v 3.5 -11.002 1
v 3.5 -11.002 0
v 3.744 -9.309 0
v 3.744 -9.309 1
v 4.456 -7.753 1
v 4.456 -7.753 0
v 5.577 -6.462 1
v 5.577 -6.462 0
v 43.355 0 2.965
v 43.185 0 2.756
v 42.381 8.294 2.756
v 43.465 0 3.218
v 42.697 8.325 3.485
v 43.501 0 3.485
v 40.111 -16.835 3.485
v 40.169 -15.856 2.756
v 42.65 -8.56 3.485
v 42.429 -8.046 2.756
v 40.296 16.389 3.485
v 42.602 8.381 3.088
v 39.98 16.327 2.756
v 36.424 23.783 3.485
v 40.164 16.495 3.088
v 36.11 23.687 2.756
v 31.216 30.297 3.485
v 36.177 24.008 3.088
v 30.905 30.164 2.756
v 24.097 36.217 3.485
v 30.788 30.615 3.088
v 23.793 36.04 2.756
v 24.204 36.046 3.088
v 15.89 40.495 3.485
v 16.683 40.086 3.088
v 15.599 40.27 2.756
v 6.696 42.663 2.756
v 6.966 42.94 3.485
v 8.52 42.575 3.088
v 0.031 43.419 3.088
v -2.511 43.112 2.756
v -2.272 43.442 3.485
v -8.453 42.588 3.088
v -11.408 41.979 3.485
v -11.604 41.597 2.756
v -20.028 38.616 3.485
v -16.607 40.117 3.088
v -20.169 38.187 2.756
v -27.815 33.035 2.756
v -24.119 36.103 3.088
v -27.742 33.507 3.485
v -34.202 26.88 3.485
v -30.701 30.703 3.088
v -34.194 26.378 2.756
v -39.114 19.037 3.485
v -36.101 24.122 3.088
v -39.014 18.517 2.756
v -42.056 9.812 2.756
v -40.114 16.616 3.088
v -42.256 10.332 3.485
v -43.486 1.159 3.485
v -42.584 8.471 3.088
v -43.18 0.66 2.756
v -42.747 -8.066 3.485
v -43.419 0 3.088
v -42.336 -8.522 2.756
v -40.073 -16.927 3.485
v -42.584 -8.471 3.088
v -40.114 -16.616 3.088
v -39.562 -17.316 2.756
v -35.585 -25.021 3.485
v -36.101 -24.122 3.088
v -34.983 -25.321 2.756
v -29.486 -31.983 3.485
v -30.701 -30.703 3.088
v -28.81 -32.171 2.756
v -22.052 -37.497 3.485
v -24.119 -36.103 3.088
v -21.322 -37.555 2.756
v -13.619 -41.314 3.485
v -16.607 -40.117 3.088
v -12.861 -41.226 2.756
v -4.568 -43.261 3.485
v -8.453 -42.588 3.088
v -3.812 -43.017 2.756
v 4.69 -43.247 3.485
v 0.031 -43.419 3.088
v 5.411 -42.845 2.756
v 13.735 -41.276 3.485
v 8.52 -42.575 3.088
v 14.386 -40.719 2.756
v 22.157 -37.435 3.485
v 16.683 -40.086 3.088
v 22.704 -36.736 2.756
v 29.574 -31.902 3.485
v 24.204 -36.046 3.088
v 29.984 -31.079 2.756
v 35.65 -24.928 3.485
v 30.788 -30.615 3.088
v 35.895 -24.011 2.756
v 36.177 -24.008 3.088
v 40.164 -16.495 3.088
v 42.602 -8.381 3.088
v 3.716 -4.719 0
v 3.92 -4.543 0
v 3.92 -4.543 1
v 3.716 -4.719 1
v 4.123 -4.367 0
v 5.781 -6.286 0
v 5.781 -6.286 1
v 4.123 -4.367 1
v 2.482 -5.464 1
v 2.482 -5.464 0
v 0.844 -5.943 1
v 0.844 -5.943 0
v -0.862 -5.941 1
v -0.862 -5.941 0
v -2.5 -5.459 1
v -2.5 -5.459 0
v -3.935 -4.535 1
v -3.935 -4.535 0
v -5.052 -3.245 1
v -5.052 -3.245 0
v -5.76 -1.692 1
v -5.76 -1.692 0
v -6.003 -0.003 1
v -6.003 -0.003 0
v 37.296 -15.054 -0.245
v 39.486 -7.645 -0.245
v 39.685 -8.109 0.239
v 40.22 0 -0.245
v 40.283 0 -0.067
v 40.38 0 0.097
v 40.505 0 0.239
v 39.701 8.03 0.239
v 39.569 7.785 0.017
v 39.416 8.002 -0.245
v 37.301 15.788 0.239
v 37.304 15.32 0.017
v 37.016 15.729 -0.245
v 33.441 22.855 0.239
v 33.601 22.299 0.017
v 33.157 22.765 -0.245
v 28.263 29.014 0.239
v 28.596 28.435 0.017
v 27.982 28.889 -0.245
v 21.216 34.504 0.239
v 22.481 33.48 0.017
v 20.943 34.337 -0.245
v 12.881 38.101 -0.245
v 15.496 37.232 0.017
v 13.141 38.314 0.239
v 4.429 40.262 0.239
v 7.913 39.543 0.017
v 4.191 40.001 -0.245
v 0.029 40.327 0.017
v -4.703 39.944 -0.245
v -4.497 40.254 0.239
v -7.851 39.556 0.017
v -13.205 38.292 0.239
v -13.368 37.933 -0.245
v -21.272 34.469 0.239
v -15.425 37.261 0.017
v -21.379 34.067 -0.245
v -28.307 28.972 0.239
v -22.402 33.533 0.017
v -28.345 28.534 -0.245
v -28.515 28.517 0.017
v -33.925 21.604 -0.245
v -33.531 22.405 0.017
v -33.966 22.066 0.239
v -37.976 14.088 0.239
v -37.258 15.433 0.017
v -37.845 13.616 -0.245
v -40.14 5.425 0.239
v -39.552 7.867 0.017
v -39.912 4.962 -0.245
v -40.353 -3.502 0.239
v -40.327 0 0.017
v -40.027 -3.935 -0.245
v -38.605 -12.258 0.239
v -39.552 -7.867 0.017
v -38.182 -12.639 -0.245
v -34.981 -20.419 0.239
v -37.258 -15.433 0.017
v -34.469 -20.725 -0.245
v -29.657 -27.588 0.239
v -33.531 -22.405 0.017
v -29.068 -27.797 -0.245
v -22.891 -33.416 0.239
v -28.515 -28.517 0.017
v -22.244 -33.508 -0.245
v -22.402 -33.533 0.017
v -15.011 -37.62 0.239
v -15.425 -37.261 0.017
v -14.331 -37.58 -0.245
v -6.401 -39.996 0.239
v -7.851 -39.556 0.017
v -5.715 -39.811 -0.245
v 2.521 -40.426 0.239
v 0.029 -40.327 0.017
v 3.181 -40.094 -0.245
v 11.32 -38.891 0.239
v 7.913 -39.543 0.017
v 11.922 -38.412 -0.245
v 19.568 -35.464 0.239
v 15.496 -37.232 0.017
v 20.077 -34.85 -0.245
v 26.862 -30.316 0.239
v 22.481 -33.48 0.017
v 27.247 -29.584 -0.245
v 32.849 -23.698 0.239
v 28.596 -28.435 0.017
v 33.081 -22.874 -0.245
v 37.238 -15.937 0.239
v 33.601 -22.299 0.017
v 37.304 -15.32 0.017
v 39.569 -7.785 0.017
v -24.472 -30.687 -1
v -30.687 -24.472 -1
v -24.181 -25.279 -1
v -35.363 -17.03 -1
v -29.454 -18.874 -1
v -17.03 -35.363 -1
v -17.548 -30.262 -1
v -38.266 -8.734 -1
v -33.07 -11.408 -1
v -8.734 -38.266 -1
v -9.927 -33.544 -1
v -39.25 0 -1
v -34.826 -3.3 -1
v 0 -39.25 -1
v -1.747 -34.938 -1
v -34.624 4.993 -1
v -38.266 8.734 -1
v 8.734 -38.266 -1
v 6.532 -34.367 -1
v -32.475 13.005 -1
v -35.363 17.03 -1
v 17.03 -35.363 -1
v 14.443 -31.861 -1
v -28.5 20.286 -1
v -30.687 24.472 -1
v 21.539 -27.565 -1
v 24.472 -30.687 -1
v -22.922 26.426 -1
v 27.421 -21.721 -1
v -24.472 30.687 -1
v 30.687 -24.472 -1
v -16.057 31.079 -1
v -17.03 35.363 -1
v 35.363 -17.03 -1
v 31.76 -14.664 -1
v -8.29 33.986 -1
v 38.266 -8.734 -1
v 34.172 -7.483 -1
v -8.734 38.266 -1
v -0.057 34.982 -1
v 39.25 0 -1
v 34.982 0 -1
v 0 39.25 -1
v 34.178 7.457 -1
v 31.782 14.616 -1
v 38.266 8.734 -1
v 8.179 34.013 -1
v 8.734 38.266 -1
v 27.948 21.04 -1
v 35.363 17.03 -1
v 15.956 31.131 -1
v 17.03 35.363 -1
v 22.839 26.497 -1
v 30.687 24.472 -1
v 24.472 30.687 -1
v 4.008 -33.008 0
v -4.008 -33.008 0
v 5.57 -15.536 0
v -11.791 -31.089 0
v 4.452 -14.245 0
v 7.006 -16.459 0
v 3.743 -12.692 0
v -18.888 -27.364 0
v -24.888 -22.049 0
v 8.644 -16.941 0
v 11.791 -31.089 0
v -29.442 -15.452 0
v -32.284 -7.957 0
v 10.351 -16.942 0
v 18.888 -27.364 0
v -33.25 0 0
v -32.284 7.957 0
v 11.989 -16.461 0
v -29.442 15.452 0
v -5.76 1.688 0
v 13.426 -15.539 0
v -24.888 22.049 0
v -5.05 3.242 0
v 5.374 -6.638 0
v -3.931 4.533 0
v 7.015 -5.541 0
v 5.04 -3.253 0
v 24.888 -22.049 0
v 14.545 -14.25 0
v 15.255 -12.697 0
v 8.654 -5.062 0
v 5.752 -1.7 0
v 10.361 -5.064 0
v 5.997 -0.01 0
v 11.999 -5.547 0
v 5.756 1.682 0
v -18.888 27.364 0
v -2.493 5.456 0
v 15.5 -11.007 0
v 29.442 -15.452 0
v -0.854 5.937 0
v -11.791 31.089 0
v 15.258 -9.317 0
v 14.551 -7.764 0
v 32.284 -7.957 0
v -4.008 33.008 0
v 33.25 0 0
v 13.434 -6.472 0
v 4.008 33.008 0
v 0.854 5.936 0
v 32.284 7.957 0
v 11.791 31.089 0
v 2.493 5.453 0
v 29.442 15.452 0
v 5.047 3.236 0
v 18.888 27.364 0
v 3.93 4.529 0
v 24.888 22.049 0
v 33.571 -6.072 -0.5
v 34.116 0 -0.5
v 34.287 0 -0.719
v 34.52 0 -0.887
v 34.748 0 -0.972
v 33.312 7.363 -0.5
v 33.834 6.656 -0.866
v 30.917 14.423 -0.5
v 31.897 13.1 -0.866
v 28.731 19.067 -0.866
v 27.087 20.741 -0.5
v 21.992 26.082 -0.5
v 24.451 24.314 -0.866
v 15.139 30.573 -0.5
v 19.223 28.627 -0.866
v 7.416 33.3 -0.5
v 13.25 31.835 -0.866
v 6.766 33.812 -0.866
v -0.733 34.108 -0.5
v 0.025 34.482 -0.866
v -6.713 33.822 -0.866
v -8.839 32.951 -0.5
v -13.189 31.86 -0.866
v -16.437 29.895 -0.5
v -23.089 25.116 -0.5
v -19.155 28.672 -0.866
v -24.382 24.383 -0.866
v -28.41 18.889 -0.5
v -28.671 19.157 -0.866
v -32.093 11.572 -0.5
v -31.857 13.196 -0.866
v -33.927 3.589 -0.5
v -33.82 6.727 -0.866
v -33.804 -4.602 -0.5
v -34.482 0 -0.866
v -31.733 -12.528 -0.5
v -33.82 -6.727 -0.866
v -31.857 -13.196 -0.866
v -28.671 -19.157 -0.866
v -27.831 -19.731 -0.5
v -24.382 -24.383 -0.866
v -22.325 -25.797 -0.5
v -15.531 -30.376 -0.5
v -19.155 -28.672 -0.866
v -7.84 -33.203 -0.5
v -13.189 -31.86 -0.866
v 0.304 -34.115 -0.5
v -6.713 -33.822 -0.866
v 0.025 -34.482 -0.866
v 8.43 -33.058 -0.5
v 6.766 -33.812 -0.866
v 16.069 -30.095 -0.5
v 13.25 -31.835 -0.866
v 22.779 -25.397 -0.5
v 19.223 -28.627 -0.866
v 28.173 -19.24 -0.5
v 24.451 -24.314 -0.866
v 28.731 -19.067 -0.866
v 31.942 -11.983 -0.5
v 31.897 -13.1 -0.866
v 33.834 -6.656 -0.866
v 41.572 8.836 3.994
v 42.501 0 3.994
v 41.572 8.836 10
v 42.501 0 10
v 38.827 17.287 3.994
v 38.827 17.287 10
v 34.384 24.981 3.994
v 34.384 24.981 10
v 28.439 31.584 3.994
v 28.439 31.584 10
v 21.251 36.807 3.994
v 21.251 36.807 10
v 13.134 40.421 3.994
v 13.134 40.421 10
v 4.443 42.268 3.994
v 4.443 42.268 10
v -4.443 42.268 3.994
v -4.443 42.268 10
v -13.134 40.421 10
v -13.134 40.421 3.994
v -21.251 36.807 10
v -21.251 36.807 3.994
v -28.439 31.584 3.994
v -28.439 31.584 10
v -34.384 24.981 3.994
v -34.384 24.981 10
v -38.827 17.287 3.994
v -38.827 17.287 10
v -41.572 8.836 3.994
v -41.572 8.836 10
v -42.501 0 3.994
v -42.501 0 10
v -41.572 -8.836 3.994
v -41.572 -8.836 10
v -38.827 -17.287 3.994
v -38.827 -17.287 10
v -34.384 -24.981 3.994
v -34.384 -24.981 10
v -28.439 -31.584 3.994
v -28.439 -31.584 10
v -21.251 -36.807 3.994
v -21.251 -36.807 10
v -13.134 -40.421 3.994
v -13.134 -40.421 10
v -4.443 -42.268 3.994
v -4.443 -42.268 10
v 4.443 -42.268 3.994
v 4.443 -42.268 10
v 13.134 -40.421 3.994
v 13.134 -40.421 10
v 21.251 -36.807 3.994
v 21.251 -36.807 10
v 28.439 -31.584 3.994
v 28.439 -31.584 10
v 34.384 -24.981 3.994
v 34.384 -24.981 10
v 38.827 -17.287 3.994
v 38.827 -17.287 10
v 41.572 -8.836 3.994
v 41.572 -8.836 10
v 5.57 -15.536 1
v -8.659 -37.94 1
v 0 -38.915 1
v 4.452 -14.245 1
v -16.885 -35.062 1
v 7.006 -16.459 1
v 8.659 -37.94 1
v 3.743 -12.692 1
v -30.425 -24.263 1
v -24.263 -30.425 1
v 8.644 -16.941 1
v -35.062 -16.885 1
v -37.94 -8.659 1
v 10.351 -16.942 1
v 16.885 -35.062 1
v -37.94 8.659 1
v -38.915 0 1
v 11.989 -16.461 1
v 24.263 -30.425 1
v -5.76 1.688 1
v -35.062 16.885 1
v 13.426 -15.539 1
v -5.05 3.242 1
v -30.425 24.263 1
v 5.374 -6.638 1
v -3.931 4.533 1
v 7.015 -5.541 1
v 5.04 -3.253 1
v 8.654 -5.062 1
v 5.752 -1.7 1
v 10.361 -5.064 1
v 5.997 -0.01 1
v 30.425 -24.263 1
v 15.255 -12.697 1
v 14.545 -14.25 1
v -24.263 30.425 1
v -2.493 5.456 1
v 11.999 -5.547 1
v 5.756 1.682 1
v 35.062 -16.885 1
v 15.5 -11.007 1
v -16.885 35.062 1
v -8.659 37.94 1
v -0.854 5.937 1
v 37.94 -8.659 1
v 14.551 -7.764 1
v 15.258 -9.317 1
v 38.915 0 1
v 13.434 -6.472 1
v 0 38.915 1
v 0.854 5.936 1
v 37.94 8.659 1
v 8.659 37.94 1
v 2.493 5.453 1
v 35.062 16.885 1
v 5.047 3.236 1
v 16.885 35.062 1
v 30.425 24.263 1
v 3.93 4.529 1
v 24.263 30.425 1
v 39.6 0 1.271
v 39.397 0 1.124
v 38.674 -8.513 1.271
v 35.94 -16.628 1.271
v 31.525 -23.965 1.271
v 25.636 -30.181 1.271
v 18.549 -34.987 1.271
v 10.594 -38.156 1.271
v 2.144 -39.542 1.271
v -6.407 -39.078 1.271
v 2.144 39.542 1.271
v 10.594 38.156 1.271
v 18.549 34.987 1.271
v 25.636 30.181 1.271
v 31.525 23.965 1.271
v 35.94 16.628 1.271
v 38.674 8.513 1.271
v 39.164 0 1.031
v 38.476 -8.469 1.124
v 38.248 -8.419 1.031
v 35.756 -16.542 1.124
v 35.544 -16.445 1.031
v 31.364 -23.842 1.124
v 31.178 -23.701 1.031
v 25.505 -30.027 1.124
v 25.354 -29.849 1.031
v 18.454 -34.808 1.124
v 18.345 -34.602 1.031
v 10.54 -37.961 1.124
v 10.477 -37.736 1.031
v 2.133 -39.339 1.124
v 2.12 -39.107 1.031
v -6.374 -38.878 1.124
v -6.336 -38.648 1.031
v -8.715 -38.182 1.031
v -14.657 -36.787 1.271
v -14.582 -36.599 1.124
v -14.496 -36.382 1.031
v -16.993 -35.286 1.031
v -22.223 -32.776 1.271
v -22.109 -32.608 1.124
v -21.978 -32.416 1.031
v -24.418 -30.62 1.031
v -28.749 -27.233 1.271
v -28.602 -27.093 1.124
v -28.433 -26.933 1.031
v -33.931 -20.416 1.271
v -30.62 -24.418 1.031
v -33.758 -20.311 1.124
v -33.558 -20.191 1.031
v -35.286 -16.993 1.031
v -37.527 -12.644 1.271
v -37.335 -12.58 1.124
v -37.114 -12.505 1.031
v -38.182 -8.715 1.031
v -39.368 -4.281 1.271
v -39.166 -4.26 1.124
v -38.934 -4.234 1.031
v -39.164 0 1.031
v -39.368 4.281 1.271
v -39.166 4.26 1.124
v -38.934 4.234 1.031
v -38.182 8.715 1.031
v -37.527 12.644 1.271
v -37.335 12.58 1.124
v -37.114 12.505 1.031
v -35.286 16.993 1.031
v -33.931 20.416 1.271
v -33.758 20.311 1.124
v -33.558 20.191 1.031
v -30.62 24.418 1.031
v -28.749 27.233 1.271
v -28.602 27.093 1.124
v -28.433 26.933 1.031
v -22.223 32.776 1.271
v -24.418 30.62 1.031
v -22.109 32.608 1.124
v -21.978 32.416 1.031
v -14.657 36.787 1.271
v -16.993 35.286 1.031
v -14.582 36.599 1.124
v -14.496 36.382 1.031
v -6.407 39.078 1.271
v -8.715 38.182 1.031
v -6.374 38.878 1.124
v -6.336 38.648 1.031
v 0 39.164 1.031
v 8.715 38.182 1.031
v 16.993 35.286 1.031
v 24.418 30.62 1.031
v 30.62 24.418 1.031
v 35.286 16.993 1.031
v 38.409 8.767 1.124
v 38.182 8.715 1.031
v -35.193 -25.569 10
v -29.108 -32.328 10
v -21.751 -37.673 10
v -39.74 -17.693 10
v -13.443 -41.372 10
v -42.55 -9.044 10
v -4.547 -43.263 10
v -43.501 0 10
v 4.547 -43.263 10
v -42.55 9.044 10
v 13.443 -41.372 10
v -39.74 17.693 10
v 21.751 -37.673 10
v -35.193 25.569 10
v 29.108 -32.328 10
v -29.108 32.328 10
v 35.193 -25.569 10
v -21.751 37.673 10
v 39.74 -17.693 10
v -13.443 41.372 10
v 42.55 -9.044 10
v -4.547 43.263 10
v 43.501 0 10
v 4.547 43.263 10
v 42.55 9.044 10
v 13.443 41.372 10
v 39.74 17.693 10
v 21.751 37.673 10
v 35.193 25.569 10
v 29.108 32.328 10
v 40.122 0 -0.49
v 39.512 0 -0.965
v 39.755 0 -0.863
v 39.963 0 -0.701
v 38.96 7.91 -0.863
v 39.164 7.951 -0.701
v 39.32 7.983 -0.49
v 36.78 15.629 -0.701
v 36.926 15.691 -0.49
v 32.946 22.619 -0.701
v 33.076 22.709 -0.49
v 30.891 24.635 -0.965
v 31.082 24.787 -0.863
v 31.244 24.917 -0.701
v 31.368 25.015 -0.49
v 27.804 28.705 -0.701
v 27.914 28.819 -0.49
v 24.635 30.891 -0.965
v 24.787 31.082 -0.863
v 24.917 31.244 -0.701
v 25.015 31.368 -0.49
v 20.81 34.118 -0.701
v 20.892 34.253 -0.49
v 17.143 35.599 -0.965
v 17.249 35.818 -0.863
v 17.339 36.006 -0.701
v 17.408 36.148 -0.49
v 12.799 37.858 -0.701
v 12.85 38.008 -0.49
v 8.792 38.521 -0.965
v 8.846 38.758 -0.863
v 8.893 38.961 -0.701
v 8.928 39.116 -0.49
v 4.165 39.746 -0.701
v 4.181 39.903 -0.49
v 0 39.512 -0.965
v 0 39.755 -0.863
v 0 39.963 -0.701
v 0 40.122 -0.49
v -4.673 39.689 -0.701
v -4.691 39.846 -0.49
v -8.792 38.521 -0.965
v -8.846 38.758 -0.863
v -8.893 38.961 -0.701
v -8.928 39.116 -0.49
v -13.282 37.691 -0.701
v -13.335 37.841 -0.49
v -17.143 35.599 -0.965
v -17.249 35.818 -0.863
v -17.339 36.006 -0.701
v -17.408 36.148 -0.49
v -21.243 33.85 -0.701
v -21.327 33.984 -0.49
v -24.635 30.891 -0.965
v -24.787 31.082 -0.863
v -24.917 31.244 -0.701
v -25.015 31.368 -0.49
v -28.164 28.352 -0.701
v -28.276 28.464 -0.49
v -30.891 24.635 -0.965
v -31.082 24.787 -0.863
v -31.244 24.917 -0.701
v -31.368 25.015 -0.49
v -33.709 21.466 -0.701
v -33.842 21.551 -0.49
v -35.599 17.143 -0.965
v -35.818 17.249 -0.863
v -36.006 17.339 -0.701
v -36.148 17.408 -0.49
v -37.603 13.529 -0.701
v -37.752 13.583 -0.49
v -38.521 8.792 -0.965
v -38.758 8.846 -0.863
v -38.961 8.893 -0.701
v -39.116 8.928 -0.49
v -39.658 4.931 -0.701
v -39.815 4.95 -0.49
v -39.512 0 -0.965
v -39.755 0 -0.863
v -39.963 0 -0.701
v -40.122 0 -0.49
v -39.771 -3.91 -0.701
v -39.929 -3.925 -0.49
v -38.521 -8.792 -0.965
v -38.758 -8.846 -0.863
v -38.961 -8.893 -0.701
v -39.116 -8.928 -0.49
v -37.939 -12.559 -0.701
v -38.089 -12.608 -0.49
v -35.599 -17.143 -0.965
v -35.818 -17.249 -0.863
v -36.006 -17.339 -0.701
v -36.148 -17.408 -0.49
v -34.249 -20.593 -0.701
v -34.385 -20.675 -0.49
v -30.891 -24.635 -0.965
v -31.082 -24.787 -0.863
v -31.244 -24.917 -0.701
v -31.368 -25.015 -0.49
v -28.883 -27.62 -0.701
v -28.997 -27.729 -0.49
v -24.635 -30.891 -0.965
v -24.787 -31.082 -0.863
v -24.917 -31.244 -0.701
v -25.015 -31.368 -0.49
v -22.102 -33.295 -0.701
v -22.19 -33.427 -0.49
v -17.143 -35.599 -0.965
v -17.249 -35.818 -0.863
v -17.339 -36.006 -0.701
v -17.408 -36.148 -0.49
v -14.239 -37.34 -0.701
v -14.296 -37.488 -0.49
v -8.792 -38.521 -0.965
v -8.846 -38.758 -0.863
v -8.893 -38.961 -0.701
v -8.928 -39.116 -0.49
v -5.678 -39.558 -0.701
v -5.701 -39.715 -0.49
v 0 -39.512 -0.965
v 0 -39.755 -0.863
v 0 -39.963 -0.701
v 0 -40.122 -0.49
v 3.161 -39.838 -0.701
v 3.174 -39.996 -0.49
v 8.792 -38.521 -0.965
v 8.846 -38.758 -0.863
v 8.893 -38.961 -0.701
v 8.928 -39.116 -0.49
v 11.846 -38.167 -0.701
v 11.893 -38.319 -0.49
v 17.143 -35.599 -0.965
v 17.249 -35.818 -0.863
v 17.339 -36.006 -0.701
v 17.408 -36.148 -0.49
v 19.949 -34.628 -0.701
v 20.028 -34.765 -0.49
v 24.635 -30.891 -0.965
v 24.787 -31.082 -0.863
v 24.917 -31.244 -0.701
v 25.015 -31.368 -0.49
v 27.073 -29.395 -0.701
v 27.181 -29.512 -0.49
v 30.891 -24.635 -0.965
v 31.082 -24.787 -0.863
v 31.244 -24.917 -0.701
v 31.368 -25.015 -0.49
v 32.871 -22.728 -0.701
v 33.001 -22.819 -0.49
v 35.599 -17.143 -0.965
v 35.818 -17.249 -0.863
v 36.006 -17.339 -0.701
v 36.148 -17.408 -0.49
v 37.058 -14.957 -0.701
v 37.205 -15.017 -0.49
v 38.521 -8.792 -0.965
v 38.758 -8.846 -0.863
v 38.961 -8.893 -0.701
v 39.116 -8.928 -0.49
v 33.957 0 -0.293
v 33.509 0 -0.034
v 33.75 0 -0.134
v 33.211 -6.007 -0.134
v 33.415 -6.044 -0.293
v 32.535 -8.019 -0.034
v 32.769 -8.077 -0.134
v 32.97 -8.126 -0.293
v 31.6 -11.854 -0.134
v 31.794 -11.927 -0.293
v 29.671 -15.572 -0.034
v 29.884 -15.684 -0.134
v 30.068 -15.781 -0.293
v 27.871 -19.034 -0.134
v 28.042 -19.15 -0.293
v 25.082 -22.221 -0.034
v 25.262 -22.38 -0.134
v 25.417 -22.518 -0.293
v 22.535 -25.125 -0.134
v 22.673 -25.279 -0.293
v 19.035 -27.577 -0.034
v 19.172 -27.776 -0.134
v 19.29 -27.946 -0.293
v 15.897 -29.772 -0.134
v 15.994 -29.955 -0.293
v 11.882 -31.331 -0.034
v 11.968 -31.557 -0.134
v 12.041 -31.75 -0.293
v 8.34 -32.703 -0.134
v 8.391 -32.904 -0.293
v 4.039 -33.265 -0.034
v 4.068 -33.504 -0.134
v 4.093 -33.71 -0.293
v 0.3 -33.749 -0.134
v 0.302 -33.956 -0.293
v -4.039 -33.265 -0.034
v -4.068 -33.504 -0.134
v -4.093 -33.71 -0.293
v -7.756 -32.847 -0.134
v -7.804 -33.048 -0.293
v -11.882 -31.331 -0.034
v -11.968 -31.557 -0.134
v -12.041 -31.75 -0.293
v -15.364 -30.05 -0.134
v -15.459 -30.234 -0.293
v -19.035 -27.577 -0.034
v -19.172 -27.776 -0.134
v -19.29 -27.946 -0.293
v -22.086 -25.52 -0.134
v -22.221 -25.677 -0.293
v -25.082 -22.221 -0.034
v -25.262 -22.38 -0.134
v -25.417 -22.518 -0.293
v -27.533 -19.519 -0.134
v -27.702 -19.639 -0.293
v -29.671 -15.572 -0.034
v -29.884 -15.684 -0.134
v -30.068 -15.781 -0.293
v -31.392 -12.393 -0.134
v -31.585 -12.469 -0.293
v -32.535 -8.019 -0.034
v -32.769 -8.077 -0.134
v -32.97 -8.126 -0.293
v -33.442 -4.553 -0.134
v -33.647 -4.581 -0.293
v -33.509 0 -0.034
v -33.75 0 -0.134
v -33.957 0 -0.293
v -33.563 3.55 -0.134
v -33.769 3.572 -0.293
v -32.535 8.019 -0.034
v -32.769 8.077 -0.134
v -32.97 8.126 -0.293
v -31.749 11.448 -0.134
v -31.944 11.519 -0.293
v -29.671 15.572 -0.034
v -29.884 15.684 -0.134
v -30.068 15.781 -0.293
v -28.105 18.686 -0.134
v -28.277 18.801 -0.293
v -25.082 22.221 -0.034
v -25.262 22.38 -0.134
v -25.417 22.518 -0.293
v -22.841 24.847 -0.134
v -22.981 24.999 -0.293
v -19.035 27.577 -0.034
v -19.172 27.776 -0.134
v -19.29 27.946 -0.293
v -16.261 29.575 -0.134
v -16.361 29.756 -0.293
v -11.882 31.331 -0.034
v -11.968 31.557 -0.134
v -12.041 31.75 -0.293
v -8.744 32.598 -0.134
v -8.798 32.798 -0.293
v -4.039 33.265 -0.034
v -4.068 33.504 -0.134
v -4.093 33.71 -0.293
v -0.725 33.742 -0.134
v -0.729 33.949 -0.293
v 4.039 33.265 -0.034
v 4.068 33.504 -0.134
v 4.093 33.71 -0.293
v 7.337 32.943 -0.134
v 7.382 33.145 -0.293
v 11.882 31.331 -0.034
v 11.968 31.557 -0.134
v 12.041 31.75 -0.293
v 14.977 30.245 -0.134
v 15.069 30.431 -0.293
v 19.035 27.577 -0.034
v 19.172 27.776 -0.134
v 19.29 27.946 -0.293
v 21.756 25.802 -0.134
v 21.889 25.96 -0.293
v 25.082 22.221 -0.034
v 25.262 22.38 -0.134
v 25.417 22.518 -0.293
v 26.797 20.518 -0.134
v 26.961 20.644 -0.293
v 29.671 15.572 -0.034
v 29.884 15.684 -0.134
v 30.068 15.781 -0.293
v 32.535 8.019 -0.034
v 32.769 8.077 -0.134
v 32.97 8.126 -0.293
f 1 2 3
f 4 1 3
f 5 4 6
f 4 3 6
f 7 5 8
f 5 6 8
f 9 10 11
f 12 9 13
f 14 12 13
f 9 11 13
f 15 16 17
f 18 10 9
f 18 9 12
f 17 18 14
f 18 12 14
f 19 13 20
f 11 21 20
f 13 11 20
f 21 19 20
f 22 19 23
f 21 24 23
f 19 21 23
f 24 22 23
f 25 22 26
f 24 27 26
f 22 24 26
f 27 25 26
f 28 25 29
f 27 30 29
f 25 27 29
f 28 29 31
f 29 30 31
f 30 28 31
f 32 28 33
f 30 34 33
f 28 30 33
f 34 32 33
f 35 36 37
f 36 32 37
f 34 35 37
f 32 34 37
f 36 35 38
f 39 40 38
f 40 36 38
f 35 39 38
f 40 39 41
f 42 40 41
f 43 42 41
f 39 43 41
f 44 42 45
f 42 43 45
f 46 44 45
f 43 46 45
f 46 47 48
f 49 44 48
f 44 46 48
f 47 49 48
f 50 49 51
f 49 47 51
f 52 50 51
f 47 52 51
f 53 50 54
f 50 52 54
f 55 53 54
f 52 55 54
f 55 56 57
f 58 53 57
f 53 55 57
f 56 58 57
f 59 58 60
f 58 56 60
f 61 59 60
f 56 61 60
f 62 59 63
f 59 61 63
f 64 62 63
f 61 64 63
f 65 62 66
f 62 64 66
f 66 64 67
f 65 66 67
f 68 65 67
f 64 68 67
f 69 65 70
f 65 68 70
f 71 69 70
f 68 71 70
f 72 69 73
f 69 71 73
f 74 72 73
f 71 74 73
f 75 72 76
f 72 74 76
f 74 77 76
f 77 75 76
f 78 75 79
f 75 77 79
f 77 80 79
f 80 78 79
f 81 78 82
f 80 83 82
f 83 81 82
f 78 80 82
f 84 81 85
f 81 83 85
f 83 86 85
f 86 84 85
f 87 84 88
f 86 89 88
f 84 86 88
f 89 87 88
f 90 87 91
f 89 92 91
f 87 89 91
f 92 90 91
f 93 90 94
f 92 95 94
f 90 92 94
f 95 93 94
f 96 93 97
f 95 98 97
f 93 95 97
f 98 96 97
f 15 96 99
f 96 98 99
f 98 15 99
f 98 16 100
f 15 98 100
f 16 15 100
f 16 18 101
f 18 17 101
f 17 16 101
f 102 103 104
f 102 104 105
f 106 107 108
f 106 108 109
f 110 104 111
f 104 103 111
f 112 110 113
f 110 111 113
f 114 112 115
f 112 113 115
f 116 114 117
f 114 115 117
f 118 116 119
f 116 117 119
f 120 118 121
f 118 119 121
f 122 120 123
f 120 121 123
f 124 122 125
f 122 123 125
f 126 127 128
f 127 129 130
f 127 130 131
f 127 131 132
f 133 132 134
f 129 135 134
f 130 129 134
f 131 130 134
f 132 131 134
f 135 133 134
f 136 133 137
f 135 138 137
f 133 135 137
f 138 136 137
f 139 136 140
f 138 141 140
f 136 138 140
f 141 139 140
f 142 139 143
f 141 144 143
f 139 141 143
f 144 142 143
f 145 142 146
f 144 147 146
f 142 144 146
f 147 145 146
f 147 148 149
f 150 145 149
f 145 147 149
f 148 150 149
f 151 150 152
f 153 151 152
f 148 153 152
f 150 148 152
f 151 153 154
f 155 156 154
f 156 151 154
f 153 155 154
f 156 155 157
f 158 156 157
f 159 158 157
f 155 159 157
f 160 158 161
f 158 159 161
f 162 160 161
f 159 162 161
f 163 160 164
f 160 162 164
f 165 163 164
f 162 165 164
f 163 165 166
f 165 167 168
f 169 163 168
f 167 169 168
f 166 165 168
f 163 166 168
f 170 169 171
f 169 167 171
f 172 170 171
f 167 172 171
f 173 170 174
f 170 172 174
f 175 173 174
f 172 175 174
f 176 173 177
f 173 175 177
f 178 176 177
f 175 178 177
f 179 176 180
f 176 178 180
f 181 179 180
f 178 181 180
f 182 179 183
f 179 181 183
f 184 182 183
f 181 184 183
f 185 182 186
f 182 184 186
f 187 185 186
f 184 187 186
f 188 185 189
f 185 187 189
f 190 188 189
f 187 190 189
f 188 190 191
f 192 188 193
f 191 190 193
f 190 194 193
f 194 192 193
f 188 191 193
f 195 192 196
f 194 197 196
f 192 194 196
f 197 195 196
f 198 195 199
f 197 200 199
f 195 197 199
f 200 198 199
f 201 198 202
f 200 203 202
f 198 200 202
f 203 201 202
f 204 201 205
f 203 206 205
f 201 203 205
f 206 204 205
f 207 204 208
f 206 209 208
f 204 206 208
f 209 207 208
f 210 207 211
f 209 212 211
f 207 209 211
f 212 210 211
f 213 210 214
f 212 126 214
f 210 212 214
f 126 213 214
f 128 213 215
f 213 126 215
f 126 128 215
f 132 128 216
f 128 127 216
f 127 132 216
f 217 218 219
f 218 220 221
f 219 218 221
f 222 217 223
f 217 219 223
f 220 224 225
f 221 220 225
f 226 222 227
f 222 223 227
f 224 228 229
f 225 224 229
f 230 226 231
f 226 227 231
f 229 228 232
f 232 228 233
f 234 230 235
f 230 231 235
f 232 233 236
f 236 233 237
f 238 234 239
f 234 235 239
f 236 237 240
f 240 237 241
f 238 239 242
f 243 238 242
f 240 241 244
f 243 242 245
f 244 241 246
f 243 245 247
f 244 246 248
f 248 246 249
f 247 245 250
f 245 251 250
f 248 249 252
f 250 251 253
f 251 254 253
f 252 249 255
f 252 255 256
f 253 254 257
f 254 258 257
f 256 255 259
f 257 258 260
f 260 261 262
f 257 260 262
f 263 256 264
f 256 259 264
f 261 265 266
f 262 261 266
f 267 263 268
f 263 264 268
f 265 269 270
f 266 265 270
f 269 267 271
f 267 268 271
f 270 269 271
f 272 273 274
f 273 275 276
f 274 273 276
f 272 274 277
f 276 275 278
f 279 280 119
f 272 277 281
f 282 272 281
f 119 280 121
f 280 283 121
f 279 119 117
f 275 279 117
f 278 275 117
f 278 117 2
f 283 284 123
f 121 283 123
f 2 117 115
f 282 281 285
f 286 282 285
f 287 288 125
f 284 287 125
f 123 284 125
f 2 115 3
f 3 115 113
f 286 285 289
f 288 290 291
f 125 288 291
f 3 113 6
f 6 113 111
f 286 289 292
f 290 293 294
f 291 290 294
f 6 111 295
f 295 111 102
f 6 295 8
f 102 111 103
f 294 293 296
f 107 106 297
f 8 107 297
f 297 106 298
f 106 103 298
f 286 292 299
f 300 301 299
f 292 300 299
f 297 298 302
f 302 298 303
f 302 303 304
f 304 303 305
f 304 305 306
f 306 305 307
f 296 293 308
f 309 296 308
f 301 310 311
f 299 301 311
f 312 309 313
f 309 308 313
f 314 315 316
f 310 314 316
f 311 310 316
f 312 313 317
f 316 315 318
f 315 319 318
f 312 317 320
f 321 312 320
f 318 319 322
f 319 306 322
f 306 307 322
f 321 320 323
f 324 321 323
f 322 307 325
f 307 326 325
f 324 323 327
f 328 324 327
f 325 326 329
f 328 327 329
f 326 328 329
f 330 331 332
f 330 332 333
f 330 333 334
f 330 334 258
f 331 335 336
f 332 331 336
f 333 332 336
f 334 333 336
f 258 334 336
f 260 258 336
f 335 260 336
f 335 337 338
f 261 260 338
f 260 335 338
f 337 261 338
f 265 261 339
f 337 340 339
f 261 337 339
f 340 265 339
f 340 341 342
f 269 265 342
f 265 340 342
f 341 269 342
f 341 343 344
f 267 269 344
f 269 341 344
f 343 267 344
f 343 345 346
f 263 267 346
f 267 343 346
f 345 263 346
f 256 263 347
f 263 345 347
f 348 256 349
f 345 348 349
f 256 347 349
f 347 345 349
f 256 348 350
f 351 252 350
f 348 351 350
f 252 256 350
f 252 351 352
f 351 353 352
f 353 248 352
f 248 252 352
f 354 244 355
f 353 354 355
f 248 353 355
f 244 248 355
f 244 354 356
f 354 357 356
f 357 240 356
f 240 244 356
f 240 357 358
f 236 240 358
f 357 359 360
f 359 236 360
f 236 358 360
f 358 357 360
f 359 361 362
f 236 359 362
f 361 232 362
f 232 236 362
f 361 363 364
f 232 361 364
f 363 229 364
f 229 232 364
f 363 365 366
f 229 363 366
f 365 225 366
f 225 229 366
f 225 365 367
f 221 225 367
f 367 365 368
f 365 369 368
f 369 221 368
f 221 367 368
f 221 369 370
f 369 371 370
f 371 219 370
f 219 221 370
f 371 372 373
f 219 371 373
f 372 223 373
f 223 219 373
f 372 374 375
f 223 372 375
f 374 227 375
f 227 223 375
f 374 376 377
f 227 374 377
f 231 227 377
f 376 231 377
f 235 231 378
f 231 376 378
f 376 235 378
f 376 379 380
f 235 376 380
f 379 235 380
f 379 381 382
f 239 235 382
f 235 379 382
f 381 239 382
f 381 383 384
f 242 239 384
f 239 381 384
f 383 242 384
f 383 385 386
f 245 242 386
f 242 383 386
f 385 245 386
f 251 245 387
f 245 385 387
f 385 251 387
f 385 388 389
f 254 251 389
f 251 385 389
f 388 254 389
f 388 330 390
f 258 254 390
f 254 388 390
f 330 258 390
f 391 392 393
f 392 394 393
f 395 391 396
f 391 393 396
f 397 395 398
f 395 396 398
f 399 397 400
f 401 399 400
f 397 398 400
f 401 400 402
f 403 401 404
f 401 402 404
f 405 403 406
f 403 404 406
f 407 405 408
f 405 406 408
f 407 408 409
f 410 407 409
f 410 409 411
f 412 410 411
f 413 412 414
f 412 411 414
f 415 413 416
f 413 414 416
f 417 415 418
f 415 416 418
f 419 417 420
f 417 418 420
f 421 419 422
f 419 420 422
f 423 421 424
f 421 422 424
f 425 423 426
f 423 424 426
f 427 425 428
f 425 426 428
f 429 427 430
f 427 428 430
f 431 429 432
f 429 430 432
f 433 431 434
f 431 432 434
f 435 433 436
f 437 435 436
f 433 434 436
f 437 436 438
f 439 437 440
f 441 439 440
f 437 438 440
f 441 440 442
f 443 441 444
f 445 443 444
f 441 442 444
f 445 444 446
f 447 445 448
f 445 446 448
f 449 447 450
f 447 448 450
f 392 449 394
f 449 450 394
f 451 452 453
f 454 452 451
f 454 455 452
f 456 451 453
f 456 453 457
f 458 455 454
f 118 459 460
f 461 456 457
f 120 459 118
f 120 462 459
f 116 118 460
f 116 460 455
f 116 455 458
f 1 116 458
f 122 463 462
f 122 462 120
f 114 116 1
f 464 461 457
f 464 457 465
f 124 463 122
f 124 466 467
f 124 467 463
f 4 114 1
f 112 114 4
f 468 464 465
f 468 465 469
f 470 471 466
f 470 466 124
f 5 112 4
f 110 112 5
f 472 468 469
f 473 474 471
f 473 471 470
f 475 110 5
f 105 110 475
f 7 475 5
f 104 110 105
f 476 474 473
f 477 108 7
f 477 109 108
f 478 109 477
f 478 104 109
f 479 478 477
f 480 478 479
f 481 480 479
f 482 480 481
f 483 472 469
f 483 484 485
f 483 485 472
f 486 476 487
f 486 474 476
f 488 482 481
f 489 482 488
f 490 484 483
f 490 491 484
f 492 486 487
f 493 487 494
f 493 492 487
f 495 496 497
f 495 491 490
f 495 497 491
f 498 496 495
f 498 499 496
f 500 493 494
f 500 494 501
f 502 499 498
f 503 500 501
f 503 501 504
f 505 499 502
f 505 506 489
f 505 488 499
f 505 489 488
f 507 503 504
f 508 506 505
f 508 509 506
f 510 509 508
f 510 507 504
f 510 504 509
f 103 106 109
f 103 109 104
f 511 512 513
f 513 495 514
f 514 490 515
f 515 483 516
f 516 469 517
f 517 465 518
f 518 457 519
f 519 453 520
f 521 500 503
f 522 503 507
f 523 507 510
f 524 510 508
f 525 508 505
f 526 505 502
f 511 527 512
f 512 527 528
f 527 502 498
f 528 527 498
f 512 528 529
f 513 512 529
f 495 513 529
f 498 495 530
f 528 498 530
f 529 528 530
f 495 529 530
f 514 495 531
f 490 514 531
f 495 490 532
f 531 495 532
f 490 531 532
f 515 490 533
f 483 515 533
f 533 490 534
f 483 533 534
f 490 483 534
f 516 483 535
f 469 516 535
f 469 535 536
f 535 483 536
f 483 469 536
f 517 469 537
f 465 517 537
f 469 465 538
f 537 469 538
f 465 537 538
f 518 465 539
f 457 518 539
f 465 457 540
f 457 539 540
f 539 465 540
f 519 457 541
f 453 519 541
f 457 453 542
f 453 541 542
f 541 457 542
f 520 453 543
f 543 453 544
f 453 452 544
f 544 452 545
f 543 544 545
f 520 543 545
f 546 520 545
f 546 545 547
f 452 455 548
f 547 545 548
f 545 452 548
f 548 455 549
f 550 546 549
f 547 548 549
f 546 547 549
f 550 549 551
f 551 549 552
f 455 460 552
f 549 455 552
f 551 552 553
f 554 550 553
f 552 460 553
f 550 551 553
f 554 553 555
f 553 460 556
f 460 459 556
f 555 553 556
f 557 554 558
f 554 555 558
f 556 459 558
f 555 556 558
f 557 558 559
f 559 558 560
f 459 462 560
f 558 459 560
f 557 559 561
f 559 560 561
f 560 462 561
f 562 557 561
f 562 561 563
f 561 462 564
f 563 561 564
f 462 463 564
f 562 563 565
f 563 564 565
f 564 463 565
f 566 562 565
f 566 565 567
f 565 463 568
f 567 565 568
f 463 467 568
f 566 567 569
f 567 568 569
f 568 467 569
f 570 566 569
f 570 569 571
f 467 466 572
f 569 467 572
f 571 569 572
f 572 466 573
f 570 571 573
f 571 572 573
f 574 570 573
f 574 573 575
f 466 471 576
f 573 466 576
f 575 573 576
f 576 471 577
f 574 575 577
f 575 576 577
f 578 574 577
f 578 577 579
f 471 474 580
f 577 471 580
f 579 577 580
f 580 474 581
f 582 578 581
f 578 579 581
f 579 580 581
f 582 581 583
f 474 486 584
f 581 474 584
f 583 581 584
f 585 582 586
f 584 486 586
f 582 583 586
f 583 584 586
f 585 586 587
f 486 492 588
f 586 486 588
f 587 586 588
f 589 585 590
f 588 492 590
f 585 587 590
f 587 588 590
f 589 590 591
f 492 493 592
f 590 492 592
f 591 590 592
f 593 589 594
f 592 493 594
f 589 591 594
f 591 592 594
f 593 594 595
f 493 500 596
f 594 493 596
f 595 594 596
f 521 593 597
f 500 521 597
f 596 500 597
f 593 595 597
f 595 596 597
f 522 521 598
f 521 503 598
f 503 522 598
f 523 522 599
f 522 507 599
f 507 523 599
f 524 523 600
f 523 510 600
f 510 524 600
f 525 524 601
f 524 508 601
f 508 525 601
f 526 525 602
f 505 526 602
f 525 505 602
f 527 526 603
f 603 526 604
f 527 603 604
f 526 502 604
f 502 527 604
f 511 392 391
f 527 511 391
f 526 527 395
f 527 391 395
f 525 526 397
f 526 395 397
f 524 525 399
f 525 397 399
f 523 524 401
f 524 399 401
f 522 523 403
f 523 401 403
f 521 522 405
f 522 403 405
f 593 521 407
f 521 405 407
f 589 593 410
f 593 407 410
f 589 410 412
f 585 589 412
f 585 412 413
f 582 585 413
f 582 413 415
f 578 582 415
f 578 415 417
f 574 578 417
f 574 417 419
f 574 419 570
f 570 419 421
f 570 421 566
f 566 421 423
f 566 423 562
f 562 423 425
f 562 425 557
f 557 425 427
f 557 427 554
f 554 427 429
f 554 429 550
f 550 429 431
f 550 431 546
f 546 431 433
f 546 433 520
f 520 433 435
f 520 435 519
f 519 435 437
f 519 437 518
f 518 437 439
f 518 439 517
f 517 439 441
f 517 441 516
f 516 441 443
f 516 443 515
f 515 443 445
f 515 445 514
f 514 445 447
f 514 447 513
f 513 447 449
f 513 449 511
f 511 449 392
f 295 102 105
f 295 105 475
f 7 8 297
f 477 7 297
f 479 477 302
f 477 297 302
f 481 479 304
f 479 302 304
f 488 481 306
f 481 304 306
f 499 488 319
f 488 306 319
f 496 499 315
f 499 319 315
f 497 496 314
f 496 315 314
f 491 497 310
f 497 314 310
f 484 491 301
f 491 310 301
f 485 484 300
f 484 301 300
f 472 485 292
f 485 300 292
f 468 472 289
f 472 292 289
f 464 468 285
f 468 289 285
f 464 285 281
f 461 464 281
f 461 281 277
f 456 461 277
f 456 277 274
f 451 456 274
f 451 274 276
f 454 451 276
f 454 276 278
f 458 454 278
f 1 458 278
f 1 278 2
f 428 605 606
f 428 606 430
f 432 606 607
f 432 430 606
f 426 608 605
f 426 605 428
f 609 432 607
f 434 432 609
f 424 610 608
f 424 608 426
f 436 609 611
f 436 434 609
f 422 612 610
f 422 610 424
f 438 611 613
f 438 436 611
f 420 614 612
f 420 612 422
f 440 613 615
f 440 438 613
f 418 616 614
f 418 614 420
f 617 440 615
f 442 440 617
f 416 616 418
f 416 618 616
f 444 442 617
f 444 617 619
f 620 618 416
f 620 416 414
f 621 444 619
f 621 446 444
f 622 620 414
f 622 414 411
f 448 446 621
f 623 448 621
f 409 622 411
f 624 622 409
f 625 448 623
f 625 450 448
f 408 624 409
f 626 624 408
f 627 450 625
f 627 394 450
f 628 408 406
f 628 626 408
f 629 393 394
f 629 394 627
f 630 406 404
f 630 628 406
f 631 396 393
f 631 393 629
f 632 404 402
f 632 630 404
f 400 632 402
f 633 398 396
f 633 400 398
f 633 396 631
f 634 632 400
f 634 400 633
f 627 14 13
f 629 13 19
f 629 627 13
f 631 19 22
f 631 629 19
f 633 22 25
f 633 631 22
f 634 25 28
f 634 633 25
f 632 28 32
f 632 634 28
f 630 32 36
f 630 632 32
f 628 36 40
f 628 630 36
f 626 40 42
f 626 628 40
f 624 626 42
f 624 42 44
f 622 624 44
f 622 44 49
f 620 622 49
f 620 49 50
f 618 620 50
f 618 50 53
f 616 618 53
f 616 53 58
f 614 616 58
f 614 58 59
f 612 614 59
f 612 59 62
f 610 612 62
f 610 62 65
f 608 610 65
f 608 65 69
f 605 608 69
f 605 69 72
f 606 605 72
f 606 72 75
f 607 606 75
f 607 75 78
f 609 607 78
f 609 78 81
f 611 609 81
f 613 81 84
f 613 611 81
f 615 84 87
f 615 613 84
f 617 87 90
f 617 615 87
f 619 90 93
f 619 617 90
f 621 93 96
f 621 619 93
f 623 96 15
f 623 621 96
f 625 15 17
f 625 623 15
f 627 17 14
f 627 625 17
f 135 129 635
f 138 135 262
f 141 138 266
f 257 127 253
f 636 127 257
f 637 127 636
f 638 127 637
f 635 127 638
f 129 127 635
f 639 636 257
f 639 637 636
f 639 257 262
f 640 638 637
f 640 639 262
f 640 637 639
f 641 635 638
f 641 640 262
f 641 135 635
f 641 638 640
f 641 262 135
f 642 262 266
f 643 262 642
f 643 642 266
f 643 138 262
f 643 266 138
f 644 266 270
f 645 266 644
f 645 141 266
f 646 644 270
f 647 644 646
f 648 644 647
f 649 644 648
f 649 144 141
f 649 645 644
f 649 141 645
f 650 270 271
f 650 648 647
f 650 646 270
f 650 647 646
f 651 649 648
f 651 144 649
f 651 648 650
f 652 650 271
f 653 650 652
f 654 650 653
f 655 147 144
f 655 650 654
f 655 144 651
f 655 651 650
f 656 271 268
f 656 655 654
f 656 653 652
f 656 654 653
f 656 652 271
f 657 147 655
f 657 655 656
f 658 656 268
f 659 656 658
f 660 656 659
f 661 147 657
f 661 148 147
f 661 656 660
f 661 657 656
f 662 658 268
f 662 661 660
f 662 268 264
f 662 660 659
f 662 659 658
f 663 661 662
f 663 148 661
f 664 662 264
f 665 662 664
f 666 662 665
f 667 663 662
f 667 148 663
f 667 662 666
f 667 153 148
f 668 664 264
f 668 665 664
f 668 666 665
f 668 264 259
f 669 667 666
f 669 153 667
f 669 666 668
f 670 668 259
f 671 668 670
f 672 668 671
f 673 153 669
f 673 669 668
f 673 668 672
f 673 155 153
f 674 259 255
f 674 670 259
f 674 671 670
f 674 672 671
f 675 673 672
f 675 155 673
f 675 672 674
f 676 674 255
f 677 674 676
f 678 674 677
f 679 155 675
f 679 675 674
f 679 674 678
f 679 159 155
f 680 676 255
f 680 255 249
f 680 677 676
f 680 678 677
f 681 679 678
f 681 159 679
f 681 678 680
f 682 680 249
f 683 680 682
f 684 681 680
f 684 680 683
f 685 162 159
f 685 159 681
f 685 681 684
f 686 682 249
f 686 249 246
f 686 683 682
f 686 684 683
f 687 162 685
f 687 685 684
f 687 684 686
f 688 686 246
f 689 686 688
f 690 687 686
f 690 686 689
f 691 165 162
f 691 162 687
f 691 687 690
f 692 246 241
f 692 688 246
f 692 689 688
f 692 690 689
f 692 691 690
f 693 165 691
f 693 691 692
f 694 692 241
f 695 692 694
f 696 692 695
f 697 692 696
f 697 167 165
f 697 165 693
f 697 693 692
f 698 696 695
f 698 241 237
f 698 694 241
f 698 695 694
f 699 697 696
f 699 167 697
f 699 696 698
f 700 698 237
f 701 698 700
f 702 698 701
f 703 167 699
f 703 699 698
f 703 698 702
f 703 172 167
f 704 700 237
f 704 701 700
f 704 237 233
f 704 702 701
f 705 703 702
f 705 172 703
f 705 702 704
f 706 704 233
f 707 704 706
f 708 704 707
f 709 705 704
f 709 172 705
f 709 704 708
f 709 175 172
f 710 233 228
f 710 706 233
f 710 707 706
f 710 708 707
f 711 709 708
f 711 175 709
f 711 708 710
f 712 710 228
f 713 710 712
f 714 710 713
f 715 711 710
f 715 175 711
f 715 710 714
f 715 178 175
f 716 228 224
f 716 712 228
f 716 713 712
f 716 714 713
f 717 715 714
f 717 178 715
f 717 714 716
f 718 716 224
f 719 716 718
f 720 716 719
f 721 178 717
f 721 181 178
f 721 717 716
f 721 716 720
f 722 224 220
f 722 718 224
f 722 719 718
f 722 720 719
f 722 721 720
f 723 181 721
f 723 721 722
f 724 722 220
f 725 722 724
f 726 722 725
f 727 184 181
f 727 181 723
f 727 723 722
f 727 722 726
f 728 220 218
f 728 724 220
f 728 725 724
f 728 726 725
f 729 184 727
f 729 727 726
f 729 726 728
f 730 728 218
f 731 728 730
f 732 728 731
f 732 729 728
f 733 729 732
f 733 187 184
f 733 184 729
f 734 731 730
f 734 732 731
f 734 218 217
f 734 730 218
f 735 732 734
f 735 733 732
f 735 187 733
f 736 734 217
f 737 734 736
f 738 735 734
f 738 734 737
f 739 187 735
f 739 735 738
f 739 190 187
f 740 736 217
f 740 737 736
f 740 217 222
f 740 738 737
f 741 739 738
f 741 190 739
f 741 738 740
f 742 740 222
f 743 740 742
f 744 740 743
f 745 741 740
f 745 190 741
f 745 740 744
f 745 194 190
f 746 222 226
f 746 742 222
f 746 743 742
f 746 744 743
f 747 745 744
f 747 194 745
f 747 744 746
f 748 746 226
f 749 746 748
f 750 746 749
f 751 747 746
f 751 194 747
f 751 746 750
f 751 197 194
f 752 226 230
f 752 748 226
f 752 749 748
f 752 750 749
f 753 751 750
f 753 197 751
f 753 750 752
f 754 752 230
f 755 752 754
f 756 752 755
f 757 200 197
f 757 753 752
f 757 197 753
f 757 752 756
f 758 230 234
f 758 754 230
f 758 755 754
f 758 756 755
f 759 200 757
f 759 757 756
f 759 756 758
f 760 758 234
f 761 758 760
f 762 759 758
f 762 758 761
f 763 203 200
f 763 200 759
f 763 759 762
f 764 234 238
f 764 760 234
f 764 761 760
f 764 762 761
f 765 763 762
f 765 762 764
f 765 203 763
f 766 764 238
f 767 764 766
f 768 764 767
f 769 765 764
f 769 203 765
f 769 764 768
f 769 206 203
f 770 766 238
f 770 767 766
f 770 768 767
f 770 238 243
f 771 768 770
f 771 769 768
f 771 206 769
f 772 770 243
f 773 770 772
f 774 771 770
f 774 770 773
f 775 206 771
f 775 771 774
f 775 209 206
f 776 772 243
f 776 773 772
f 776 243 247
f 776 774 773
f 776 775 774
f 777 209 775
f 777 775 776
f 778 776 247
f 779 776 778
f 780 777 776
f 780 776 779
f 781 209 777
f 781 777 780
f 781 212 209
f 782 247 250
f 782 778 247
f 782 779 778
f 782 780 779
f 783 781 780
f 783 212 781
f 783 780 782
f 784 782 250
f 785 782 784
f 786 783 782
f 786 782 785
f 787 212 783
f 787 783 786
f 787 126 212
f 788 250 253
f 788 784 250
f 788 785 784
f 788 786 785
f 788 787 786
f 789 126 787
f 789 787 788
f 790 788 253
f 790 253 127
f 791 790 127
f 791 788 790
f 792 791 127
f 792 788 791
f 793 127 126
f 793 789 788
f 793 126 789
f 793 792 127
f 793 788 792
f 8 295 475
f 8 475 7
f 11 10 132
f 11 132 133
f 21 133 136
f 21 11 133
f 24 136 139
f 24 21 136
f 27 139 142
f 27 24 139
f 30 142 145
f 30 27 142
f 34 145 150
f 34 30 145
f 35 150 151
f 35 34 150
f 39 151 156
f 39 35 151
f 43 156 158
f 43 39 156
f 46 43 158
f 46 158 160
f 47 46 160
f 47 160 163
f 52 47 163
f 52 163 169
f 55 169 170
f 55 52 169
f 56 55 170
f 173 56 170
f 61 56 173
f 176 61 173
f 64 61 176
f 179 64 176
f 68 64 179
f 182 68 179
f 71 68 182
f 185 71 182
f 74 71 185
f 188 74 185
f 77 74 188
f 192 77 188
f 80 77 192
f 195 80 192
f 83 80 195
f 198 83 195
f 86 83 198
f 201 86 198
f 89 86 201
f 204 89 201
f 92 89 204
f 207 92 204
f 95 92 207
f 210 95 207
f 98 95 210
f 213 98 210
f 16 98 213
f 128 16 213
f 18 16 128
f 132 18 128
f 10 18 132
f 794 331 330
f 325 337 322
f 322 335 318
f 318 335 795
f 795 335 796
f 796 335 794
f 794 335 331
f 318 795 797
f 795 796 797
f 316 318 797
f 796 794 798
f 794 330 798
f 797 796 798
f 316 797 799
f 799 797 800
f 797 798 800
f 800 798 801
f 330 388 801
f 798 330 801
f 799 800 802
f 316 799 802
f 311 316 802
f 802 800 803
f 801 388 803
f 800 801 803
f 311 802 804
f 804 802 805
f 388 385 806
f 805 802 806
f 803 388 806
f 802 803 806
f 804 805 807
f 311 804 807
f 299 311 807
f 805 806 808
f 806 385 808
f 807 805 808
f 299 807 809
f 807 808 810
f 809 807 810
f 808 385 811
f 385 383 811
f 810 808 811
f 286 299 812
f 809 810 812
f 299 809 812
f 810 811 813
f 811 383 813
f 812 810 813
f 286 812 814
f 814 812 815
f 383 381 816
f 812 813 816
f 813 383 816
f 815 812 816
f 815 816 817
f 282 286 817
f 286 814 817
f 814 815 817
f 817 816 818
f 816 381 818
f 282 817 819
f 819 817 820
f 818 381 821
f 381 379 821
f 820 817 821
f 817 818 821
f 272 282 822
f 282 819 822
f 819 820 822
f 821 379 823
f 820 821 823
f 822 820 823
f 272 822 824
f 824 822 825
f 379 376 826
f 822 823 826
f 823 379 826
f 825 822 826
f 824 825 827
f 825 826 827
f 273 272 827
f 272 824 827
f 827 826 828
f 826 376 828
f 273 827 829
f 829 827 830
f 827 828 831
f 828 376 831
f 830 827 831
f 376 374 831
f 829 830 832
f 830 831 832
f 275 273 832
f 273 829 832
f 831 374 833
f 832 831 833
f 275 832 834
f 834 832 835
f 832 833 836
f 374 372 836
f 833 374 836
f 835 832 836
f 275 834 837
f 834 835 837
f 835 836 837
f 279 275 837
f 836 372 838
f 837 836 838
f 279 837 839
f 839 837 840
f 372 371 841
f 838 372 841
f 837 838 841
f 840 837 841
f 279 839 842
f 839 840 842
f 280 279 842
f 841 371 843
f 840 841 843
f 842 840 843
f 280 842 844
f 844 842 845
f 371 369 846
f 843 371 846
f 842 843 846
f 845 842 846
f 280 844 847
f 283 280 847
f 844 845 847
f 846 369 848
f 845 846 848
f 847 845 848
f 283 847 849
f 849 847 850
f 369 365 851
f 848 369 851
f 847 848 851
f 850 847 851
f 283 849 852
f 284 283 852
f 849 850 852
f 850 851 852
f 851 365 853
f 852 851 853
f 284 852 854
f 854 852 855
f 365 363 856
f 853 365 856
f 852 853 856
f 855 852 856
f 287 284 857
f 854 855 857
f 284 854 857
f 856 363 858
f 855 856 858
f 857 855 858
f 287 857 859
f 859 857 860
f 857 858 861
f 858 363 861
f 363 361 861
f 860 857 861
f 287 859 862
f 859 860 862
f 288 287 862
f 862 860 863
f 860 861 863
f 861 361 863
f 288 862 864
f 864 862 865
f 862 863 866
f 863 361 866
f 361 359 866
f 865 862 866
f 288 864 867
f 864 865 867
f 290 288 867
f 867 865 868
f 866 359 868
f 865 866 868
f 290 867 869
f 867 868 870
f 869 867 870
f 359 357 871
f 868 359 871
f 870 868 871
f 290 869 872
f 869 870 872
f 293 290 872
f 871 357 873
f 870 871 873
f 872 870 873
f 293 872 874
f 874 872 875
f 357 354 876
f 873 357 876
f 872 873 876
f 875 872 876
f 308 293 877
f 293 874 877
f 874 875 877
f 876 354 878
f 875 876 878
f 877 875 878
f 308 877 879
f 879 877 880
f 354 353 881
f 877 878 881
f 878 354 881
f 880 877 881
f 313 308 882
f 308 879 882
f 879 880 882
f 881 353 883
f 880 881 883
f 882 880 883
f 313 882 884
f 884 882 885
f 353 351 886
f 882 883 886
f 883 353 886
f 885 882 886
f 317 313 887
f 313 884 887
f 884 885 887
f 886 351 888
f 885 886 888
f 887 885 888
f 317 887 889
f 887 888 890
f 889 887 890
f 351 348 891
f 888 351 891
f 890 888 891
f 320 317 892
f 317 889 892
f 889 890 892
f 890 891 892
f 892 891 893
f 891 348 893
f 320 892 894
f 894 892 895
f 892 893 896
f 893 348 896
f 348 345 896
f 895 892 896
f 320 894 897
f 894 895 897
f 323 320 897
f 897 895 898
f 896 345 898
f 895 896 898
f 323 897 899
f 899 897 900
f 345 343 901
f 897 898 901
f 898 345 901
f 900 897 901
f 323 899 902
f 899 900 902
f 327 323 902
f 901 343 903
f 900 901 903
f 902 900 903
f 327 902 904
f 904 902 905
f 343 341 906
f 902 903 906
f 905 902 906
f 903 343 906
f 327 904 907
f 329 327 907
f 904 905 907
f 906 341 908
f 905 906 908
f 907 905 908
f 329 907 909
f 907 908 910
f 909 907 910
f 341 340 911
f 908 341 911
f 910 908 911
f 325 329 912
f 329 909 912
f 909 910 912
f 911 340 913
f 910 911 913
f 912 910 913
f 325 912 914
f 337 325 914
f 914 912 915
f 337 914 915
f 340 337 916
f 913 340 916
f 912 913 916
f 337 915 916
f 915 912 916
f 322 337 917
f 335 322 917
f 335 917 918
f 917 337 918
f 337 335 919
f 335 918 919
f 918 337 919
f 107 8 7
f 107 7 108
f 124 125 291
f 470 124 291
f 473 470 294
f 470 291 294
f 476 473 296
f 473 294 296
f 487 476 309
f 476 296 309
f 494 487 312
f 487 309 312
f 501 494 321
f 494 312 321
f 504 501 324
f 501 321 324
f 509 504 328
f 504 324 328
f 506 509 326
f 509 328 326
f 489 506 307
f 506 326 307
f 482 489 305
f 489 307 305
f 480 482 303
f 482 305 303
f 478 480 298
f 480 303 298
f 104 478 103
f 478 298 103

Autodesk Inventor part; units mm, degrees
ref_plane "YZ Plane" through (0, 0, 0) normal (1, 0, 0) x (0, 1, 0)
ref_plane "XZ Plane" through (0, 0, 0) normal (0, 1, 0) x (-1, 0, 0)
ref_plane "XY Plane" through (0, 0, 0) normal (0, 0, 1) x (1, 0, 0)
sketch "Skizze1" plane through (0, 0, 0) normal (0, 1, 0) x (-1, 0, 0)
  line L0 (0, 0) -> (-34.25, 0)
  line L1 (-34.25, 0) -> (-34.25, -1)
  line L2 (-34.25, -1) -> (-40.25, -1)
  line L3 (-40.25, -1) -> (-40.25, 0)
  line L4 (-40.25, 0) -> (-43.501, 3.052)
  line L5 (-43.501, 3.052) -> (-43.501, 10)
  line L6 (0, 0) -> (0, 1)
  line L7 (0, 1) -> (-39.3112, 1)
  line L8 (-39.3112, 1) -> (-42.501, 3.9945)
  line L9 (-42.501, 3.9945) -> (-42.501, 10)
  line L10 (-42.501, 10) -> (-43.501, 10)
  dimension "d0" = 34.25
  dimension "d1" = 1
  dimension "d2" = 6
  dimension "d3" = 10
  dimension "d4" = 1
  dimension "d5" = 1
revolve "Umdrehung1" add sketch "Skizze1" angle 360 about axis through (0, 0, 0) along (0, 0, 1)
fillet "Rundung1" radius 1 6 edges at (-34.25, 0, 0) (-34.25, 0, -1) (-40.25, 0, -1) (-40.25, 0, 0) (-43.501, 0, 3.052) (-39.3112, 0, 1)
sketch "Skizze2" plane through (0, 0, 0) normal (0, 0, -1) x (-1, 0, 0)
  circle A0 centre (0.0031, -0.0027) radius 3 projected
  arc A1 (-12.0467, -11.77) -> (-7.3029, -12.5022) centre (-9.4998, -11.0022) ccw projected
  circle A2 centre (0.0031, -0.0027) radius 6
  circle A3 centre (-9.4998, -11.0022) radius 6
  line L0 (0.0031, -0.0027) -> (-9.4998, -11.0022)
  line L1 (-5.781, -6.2859) -> (-4.1232, -4.3669)
  line L2 (-4.1232, -4.3669) -> (-3.7157, -4.719)
  line L3 (-3.7157, -4.719) -> (-5.3735, -6.6379)
  line L4 (-5.3735, -6.6379) -> (-5.781, -6.2859)
  line L5 (-5.781, -6.2859) -> (-3.7157, -4.719) construction
  line L6 (-4.1232, -4.3669) -> (-5.3735, -6.6379) construction
  point P0 (0, 0)
  point P1 (-4.7484, -5.5024)
  point P2 (-5.5773, -6.4619)
  point P3 (-3.9194, -4.543)
  dimension "d8" = 12
  dimension "d9" = 12
extrude "Extrusion1" cut sketch "Skizze2" against normal blind 10 contours A0 | A2 | A3 | L2 L3 L4 L0 | L0 L4 L1 L2
ref_plane "Arbeitsebene1" through (3.9194, -4.543, 0) normal (-0.7567077, -0.6537534, 0) x (0, 0, 1)
equation "\"Biegeradius\" = Stärke"
equation "\"BreiteBiegungsfreistellung\" = Stärke"
equation "\"TiefeBiegungsfreistellung\" = 0.5 * Stärke"
equation "\"GrößeEckenfreistellung\" = 4 * Stärke"
equation "\"MinimalRest\" = 2 * Stärke"
equation "\"Übergangsradius\" = Biegeradius"
equation "\"JacobiRadiusGröße\" = Biegeradius"
equation "\"Abstandsgröße\" = Stärke"
equation "\"Stärke\" = 3.048"
properties part number "00_Lid_Bonne_Mamman"
